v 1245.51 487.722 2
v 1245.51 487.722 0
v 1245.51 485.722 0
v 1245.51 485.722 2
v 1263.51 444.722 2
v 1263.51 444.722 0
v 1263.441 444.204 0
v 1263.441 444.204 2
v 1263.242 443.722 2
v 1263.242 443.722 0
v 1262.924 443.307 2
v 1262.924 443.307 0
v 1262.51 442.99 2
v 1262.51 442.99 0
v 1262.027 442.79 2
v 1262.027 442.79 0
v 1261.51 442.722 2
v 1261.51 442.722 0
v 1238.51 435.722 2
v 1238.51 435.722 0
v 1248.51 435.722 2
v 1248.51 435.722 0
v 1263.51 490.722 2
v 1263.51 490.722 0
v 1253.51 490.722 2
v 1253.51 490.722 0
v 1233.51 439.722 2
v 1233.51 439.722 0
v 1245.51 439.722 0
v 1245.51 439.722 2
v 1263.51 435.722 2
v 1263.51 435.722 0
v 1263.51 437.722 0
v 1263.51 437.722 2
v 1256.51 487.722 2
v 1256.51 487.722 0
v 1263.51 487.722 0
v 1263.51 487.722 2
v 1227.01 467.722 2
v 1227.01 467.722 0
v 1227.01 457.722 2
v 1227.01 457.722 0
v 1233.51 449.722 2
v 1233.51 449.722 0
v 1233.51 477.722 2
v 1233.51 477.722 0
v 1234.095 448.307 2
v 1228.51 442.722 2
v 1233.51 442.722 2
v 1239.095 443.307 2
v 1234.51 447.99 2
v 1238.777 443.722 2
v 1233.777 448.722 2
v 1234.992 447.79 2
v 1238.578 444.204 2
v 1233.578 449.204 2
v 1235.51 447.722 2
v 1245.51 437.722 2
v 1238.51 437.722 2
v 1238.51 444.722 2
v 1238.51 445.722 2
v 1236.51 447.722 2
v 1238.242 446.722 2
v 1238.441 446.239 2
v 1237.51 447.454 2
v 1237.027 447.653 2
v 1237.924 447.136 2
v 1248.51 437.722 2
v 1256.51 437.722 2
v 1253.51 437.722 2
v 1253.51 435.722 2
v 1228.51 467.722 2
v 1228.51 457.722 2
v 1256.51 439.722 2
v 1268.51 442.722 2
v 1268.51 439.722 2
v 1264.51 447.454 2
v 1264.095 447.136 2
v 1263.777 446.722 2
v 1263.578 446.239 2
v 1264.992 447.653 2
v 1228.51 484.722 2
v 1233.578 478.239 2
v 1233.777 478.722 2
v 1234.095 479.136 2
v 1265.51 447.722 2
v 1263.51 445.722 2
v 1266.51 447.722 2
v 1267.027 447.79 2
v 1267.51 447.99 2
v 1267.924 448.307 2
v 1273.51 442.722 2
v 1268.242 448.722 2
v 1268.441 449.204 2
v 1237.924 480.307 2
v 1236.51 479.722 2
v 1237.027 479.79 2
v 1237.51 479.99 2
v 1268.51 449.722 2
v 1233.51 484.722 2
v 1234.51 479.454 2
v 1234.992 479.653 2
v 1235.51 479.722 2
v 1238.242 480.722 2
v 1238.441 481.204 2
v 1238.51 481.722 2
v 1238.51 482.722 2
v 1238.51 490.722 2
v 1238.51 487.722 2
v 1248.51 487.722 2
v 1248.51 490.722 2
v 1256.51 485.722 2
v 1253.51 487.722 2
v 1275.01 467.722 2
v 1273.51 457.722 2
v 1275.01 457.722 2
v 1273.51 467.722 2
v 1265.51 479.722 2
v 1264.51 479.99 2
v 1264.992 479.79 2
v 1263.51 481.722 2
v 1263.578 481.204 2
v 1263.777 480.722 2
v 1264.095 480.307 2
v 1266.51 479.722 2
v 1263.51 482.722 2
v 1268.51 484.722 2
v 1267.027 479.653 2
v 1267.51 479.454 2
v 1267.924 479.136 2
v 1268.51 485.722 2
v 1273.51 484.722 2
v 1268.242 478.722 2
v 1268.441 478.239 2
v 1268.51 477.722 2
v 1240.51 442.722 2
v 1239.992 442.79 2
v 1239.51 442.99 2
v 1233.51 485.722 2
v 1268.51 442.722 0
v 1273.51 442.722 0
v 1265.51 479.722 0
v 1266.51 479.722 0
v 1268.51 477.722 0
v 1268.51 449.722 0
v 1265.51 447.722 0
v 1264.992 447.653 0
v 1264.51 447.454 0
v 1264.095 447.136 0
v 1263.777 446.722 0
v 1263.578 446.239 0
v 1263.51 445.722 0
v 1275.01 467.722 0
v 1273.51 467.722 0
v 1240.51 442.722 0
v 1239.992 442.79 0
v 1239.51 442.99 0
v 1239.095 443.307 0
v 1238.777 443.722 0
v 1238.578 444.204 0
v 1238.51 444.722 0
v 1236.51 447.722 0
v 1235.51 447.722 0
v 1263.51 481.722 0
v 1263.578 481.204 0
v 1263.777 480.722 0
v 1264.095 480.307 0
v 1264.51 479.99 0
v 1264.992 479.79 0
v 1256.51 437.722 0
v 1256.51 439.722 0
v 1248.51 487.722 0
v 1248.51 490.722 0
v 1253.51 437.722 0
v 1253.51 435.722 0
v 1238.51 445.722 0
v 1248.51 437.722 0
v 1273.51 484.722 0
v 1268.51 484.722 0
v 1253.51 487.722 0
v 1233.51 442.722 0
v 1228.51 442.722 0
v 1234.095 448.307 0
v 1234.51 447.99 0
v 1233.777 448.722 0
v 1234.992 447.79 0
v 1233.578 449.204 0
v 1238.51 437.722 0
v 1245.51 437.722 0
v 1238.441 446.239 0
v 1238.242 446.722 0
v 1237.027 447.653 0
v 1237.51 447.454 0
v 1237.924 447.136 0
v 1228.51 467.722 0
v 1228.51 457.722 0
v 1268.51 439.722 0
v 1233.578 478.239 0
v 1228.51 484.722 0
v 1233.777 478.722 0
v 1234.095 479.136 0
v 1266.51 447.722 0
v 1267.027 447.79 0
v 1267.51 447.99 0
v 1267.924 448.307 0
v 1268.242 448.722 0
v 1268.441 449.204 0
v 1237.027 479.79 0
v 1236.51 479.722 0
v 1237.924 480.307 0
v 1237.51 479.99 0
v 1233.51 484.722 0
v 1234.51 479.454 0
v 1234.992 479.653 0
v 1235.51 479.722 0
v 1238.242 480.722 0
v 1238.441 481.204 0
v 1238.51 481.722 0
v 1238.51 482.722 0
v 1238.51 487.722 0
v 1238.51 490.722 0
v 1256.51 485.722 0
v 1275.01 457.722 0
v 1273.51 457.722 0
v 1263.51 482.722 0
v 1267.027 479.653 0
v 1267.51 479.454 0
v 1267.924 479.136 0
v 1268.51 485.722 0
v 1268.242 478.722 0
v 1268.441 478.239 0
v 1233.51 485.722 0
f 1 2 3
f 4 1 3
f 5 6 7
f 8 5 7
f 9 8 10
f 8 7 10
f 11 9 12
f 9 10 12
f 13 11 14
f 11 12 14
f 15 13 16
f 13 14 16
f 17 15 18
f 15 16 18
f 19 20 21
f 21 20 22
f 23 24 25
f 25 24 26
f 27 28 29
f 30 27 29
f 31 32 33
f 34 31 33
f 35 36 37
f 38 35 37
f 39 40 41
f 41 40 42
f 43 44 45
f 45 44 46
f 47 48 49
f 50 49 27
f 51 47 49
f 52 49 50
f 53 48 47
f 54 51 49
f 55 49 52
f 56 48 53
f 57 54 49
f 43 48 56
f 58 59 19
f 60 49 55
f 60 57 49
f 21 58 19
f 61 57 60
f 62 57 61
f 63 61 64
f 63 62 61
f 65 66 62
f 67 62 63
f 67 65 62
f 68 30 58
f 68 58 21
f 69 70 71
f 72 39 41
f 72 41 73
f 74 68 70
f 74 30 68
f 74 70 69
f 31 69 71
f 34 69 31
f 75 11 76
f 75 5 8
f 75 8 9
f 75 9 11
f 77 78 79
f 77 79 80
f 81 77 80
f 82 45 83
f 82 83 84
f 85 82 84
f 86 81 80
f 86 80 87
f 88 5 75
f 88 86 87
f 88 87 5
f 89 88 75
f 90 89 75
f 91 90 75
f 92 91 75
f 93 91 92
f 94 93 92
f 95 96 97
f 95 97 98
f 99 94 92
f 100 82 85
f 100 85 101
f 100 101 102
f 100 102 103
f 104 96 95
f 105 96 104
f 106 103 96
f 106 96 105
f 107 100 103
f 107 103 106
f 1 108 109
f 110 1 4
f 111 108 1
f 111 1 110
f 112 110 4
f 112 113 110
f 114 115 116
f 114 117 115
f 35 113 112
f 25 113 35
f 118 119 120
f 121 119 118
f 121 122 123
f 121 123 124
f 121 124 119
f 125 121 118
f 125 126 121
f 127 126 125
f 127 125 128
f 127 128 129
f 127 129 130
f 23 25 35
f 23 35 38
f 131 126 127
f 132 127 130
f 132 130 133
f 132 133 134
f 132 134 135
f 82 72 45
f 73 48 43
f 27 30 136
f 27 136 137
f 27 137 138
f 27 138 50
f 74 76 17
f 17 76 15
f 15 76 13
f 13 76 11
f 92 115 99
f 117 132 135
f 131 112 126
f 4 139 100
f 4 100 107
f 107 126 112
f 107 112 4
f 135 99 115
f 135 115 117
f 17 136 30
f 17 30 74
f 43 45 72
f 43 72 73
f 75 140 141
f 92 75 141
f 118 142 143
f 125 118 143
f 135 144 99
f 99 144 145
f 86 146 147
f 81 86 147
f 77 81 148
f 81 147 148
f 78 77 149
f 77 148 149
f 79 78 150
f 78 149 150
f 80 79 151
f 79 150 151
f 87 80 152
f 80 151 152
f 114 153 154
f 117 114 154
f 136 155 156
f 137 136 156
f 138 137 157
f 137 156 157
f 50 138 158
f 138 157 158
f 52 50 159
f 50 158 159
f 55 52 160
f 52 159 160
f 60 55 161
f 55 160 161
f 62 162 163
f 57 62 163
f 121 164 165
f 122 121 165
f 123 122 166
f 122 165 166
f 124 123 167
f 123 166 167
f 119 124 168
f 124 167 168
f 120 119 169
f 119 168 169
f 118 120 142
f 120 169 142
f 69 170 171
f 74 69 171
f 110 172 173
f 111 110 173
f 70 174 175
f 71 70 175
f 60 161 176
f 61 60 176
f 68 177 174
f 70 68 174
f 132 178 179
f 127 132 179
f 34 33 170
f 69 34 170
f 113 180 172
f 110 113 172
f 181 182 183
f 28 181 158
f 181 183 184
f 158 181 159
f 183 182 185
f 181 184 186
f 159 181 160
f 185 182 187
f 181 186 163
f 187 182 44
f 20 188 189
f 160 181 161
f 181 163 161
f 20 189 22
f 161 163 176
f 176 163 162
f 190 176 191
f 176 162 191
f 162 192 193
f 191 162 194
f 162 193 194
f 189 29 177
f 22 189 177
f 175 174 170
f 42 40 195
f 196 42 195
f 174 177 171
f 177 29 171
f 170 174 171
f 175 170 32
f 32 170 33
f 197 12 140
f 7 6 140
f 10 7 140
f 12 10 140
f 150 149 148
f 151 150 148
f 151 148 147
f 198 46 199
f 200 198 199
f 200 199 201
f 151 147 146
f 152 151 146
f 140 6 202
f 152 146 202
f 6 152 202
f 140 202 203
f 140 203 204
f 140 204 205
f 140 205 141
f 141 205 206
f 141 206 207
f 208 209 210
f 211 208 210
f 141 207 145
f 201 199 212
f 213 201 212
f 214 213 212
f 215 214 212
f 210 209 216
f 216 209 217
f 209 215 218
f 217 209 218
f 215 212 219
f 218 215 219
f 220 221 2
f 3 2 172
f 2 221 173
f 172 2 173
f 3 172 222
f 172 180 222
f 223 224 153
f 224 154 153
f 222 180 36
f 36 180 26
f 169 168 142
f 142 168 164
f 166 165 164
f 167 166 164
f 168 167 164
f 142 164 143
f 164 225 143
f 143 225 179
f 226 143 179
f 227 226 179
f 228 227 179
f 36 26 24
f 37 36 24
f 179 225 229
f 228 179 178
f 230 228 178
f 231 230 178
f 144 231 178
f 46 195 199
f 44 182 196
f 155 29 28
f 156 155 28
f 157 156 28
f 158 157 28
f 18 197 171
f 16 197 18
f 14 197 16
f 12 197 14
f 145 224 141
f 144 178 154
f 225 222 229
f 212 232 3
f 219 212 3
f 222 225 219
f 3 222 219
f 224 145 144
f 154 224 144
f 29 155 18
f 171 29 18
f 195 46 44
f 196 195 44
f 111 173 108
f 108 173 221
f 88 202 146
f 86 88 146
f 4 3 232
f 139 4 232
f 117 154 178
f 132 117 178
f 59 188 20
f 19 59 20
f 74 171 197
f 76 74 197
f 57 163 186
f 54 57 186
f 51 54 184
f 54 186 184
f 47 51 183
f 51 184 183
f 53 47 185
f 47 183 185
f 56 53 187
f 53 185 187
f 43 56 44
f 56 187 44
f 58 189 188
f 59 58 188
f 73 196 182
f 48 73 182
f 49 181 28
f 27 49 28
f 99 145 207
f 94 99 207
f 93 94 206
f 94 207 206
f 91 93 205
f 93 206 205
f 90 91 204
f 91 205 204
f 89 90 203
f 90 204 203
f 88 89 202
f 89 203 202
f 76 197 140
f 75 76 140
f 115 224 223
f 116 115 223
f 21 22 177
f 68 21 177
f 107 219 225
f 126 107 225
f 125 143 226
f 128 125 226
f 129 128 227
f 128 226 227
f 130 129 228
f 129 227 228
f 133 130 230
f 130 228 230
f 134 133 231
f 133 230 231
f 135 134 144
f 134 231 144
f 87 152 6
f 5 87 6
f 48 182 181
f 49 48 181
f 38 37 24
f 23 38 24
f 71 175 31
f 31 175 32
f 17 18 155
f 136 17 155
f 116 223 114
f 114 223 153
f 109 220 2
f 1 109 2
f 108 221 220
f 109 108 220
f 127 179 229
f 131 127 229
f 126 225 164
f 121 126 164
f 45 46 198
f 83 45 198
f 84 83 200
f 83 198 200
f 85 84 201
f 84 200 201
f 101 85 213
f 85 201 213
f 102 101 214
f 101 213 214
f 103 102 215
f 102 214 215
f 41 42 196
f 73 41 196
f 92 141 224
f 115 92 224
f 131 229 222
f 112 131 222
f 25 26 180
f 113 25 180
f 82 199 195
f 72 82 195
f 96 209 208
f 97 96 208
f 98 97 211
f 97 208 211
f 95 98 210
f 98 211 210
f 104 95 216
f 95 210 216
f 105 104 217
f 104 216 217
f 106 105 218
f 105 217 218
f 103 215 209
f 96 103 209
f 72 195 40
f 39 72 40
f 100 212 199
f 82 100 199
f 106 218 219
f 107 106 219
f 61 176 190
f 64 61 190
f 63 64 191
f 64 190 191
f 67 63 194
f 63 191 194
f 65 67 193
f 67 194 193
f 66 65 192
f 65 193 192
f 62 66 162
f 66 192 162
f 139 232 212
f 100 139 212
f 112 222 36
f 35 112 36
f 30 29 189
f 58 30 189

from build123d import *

# Parameters (mm, degrees)
EXTRUDE_1_DEPTH = 2


with BuildPart() as part:
    # Model → 凸台-拉伸1 (new body)
    with BuildSketch(Plane.XY):
        Polygon((1228.50953615, 484.721569843), (1228.50953615, 467.721569843), (1227.00953615, 467.721569843), (1227.00953615, 457.721569843), (1228.50953615, 457.721569843), (1228.50953615, 442.721569843), (1233.50953615, 442.721569843), (1233.50953615, 439.721569843), (1245.50953615, 439.721569843), (1245.50953615, 437.721569843), (1238.50953615, 437.721569843), (1238.50953615, 435.721569843), (1248.50953615, 435.721569843), (1248.50953615, 437.721569843), (1253.50953615, 437.721569843), (1253.50953615, 435.721569843), (1263.50953615, 435.721569843), (1263.50953615, 437.721569843), (1256.50953615, 437.721569843), (1256.50953615, 439.721569843), (1268.50953615, 439.721569843), (1268.50953615, 442.721569843), (1273.50953615, 442.721569843), (1273.50953615, 457.721569843), (1275.00953615, 457.721569843), (1275.00953615, 467.721569843), (1273.50953615, 467.721569843), (1273.50953615, 484.721569843), (1268.50953615, 484.721569843), (1268.50953615, 485.721569843), (1256.50953615, 485.721569843), (1256.50953615, 487.721569843), (1263.50953615, 487.721569843), (1263.50953615, 490.721569843), (1253.50953615, 490.721569843), (1253.50953615, 487.721569843), (1248.50953615, 487.721569843), (1248.50953615, 490.721569843), (1238.50953615, 490.721569843), (1238.50953615, 487.721569843), (1245.50953615, 487.721569843), (1245.50953615, 485.721569843), (1233.50953615, 485.721569843), (1233.50953615, 484.721569843), align=None)
        with BuildLine():
            Line((1235.50953615, 479.721569843), (1236.50953615, 479.721569843))
            ThreePointArc((1236.50953615, 479.721569843), (1237.923749713, 480.307356281), (1238.50953615, 481.721569843))
            Line((1238.50953615, 481.721569843), (1238.50953615, 482.721569843))
            Line((1238.50953615, 482.721569843), (1263.50953615, 482.721569843))
            Line((1263.50953615, 482.721569843), (1263.50953615, 481.721569843))
            ThreePointArc((1263.50953615, 481.721569843), (1264.095322588, 480.307356281), (1265.50953615, 479.721569843))
            Line((1265.50953615, 479.721569843), (1266.50953615, 479.721569843))
            ThreePointArc((1266.50953615, 479.721569843), (1267.923749713, 479.135783405), (1268.50953615, 477.721569843))
            Line((1268.50953615, 477.721569843), (1268.50953615, 449.721569843))
            ThreePointArc((1268.50953615, 449.721569843), (1267.923749713, 448.307356281), (1266.50953615, 447.721569843))
            Line((1266.50953615, 447.721569843), (1265.50953615, 447.721569843))
            ThreePointArc((1265.50953615, 447.721569843), (1264.095322588, 447.135783405), (1263.50953615, 445.721569843))
            Line((1263.50953615, 445.721569843), (1263.50953615, 444.721569843))
            ThreePointArc((1263.50953615, 444.721569843), (1262.923749713, 443.307356281), (1261.50953615, 442.721569843))
            Line((1261.50953615, 442.721569843), (1240.50953615, 442.721569843))
            ThreePointArc((1240.50953615, 442.721569843), (1239.095322588, 443.307356281), (1238.50953615, 444.721569843))
            Line((1238.50953615, 444.721569843), (1238.50953615, 445.721569843))
            ThreePointArc((1238.50953615, 445.721569843), (1237.923749713, 447.135783405), (1236.50953615, 447.721569843))
            Line((1236.50953615, 447.721569843), (1235.50953615, 447.721569843))
            ThreePointArc((1235.50953615, 447.721569843), (1234.095322588, 448.307356281), (1233.50953615, 449.721569843))
            Line((1233.50953615, 449.721569843), (1233.50953615, 477.721569843))
            ThreePointArc((1233.50953615, 477.721569843), (1234.095322588, 479.135783405), (1235.50953615, 479.721569843))
        make_face(mode=Mode.SUBTRACT)
    extrude(amount=EXTRUDE_1_DEPTH)


solid = part.part
